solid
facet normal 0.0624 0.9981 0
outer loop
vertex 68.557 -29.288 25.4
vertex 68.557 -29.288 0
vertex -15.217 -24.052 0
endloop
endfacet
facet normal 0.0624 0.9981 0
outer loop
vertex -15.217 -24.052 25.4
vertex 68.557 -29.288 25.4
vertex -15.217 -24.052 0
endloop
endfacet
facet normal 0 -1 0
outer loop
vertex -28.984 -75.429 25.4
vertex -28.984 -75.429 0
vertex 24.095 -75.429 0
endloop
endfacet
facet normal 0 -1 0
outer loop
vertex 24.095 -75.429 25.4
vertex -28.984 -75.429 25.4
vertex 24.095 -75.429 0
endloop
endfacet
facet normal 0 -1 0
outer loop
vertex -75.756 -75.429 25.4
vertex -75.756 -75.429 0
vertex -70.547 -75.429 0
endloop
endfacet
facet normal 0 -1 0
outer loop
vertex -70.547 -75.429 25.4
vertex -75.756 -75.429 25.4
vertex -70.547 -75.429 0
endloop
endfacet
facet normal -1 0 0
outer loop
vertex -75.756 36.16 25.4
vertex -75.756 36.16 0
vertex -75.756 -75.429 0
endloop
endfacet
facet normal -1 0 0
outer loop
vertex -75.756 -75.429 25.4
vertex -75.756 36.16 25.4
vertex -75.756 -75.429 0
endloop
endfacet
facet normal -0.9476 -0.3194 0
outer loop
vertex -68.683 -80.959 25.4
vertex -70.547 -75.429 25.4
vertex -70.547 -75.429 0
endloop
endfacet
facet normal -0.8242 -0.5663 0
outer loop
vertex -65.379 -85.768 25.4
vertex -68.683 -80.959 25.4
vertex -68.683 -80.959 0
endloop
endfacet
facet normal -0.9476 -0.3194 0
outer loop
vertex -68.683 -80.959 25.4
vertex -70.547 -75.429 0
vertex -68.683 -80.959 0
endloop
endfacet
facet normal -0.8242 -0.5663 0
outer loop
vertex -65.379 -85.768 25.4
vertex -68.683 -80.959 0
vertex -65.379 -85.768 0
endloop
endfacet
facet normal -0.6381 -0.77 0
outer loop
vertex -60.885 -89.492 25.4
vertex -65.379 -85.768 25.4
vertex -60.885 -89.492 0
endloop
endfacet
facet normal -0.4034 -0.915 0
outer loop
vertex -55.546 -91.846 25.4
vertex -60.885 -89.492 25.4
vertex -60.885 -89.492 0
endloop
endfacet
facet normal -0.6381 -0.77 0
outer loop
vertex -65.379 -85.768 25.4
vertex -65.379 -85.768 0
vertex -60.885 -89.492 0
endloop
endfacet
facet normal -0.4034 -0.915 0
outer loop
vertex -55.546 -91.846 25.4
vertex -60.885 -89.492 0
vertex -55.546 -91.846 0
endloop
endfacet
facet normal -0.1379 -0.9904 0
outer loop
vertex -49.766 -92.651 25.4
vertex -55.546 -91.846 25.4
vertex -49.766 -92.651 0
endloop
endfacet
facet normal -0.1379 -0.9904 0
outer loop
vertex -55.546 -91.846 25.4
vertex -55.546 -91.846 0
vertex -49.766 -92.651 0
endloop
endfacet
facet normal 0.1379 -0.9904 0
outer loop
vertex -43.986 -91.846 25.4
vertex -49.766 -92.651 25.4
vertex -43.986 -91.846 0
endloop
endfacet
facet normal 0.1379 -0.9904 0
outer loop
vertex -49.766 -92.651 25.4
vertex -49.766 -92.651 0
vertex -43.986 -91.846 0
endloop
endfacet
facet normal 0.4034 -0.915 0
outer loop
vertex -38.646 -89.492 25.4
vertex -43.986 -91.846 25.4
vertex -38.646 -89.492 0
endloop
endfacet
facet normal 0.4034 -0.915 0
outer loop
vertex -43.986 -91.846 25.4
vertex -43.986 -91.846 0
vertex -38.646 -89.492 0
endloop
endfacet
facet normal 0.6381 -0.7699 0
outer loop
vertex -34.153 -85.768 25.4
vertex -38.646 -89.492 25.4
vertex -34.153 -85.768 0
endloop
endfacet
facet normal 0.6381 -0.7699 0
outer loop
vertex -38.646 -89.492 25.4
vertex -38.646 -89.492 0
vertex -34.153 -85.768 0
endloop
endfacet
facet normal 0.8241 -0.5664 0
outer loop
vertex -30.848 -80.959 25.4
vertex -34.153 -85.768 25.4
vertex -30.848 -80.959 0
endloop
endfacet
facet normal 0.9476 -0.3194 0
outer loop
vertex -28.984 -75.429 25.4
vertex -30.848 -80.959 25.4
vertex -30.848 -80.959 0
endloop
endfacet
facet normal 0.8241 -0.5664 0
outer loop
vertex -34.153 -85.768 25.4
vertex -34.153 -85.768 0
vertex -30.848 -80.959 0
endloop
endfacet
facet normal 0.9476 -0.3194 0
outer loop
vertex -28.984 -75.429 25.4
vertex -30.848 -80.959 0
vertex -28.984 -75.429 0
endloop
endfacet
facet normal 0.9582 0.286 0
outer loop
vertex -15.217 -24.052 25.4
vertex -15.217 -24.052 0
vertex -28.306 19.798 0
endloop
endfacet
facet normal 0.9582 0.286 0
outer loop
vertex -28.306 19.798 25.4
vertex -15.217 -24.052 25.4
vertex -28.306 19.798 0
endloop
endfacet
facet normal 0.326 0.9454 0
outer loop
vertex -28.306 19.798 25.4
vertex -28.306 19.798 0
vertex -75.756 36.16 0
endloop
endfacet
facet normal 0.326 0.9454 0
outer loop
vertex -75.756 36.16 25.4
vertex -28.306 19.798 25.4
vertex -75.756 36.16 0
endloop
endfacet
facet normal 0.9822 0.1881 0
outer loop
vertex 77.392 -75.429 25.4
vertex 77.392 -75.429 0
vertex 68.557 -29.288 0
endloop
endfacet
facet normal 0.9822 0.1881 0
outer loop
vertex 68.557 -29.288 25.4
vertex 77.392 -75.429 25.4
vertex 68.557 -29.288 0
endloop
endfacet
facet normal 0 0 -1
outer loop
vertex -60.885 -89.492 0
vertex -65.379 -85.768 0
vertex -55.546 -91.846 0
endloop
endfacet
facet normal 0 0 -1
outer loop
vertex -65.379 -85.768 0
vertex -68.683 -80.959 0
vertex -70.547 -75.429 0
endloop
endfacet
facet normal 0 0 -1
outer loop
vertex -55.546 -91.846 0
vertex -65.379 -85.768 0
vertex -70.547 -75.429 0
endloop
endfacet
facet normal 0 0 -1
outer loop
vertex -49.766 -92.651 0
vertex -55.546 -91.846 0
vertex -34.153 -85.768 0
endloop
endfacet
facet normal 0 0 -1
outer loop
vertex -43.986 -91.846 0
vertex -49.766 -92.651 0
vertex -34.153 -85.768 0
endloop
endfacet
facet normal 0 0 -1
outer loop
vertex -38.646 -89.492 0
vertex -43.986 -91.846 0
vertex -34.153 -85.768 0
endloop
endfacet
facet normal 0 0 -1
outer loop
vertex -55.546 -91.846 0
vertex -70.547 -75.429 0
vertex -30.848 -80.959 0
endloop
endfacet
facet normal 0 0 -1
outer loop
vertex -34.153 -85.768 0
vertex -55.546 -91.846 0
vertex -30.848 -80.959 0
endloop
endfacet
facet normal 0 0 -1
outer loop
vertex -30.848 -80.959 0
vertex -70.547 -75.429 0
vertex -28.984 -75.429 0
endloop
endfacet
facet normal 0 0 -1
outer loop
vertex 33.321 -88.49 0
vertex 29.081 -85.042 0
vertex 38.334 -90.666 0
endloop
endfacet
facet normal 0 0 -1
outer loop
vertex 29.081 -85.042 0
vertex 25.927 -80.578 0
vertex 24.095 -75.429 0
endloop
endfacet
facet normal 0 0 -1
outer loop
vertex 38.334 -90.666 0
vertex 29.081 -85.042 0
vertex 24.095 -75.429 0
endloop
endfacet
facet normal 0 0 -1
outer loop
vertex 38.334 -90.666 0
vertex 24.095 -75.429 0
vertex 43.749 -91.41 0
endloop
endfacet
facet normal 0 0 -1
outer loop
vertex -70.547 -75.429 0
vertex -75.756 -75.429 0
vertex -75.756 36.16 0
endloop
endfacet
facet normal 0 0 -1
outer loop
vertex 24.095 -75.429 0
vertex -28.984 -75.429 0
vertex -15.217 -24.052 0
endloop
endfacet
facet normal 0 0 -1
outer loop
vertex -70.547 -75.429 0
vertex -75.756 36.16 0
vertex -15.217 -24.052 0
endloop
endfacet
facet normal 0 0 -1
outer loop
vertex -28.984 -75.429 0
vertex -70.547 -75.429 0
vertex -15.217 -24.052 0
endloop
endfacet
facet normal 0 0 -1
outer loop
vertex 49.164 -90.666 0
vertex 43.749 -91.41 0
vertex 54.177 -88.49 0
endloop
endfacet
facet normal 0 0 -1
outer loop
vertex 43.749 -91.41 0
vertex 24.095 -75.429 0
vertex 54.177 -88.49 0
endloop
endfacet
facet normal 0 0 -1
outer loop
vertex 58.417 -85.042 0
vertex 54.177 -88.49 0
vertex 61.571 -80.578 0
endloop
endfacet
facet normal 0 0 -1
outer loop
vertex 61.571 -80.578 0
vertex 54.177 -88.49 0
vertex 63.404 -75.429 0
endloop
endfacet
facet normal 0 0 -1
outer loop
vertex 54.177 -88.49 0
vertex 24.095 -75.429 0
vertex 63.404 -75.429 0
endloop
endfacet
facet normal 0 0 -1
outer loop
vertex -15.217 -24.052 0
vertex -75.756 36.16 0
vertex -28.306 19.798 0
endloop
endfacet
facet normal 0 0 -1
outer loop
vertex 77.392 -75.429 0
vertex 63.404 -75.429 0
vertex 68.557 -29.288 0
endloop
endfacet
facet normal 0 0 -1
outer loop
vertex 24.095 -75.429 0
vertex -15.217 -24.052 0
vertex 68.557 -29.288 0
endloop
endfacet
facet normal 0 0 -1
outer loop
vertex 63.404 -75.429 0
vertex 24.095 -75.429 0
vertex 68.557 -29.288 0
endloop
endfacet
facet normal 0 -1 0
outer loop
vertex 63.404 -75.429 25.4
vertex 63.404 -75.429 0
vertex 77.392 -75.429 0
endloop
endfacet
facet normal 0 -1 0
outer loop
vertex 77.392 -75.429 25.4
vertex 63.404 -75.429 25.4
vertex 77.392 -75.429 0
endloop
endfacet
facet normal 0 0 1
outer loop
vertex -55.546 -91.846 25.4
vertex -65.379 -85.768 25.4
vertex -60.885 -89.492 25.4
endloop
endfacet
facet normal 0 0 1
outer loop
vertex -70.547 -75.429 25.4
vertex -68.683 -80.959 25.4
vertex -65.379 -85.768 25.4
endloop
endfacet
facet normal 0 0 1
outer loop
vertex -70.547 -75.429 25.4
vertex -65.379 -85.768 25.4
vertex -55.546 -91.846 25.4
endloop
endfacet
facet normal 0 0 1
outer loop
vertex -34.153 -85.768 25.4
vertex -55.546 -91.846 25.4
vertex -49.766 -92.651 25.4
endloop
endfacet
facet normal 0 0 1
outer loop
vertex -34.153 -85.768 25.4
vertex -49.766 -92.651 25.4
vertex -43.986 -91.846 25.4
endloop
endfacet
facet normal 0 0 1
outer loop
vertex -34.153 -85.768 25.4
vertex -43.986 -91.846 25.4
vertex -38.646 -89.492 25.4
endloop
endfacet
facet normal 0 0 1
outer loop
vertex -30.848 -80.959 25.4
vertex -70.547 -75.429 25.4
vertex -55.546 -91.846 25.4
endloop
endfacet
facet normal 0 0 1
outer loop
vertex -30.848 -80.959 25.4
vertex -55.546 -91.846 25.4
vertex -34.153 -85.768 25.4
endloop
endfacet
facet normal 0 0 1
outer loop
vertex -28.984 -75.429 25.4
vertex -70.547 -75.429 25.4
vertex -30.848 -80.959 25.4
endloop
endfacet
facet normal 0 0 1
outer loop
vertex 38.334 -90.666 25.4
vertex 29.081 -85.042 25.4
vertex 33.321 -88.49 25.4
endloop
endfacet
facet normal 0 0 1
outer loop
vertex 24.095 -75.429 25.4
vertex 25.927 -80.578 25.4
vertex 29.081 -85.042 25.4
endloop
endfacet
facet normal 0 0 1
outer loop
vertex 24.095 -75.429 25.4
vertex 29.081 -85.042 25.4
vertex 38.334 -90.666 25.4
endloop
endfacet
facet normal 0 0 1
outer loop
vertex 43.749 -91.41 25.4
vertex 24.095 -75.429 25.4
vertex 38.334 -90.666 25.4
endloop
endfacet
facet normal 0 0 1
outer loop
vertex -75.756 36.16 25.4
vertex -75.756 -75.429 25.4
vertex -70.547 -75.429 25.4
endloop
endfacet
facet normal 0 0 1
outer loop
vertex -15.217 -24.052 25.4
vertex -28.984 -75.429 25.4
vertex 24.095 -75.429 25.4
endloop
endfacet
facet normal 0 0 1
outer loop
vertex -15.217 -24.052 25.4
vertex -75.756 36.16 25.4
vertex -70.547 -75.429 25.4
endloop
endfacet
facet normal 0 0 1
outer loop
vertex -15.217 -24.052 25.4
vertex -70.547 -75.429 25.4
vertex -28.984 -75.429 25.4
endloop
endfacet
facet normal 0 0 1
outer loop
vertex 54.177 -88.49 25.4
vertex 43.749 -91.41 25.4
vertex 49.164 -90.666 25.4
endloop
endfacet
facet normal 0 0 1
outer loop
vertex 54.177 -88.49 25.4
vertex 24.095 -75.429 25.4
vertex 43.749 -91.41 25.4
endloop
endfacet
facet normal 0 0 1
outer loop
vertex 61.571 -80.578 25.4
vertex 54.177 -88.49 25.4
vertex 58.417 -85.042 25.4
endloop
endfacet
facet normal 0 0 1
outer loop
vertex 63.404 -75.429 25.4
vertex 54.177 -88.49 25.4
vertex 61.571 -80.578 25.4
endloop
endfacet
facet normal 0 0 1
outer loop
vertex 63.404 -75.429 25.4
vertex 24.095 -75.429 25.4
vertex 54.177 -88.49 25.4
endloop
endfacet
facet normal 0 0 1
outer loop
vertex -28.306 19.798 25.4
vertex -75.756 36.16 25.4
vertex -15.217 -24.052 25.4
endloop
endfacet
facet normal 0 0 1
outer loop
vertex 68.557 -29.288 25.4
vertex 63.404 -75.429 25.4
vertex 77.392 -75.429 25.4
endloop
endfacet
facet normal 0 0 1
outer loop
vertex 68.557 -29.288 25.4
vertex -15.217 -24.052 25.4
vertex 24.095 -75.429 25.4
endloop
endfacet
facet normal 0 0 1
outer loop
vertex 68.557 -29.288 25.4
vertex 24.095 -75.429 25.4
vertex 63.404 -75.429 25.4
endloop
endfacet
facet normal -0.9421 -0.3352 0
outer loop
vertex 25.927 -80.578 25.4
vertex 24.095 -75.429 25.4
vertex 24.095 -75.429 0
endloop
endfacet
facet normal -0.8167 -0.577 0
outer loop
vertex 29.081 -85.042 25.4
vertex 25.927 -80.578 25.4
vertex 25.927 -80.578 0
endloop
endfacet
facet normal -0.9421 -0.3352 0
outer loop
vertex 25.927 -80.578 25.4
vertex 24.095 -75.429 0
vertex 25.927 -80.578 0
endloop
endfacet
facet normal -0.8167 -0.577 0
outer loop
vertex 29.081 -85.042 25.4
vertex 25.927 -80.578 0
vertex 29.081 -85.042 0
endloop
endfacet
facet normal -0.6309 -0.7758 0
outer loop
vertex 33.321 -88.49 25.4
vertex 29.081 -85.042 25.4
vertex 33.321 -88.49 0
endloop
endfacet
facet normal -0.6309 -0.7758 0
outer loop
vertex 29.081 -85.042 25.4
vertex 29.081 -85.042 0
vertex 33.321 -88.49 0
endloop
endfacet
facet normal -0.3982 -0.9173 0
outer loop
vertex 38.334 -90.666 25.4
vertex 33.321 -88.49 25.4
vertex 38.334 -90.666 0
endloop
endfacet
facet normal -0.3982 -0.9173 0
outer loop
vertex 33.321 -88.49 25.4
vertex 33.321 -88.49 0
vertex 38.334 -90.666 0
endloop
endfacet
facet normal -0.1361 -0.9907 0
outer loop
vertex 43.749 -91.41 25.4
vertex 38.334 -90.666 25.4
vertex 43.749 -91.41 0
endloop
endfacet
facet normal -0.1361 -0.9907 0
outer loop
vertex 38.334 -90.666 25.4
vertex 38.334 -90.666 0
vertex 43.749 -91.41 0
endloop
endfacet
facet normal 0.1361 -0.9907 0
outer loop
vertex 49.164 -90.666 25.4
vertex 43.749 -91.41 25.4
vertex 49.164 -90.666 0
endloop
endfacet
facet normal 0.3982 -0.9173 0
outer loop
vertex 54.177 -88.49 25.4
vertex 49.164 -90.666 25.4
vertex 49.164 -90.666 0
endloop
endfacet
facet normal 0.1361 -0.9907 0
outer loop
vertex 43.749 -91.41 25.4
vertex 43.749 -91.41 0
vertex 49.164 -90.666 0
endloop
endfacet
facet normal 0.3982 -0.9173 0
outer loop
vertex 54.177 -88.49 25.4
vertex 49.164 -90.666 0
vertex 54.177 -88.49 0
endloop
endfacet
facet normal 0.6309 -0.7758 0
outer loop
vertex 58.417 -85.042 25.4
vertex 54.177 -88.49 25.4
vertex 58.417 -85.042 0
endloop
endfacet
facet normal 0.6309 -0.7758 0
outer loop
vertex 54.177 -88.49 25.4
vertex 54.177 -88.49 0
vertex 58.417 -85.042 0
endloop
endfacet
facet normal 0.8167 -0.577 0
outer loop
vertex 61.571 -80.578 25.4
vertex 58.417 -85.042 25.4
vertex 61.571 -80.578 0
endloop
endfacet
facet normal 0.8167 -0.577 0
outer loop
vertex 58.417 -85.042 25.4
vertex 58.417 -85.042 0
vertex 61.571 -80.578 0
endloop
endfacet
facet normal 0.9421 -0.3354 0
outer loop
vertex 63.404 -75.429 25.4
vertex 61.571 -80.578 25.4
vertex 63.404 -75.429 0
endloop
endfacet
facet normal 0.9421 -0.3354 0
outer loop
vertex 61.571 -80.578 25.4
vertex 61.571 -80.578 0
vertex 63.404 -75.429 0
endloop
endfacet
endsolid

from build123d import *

# Parameters (mm, degrees)
F1_DEPTH = 25.4
F2_R     = 21.149451
F2_R_2   = 20.076598
F3_DEPTH = 25.4


with BuildPart() as f1:
    # F0 (on Top) → F1 (new body)
    with BuildSketch(Plane.XY):
        Polygon((-75.755887, 36.15994), (-75.755887, -75.42865), (77.392094, -75.42865), (68.556629, -29.287914), (-15.216626, -24.052085), (-28.306197, 19.797975), align=None)
    extrude(amount=F1_DEPTH)

    # F2 (on Top) → F3 (join)
    with BuildSketch(Plane.XY):
        with Locations((-49.765799, -71.501784)):
            Circle(F2_R)
        with Locations((43.749049, -71.333706)):
            Circle(F2_R_2)
    extrude(amount=F3_DEPTH)


solid = f1.part
